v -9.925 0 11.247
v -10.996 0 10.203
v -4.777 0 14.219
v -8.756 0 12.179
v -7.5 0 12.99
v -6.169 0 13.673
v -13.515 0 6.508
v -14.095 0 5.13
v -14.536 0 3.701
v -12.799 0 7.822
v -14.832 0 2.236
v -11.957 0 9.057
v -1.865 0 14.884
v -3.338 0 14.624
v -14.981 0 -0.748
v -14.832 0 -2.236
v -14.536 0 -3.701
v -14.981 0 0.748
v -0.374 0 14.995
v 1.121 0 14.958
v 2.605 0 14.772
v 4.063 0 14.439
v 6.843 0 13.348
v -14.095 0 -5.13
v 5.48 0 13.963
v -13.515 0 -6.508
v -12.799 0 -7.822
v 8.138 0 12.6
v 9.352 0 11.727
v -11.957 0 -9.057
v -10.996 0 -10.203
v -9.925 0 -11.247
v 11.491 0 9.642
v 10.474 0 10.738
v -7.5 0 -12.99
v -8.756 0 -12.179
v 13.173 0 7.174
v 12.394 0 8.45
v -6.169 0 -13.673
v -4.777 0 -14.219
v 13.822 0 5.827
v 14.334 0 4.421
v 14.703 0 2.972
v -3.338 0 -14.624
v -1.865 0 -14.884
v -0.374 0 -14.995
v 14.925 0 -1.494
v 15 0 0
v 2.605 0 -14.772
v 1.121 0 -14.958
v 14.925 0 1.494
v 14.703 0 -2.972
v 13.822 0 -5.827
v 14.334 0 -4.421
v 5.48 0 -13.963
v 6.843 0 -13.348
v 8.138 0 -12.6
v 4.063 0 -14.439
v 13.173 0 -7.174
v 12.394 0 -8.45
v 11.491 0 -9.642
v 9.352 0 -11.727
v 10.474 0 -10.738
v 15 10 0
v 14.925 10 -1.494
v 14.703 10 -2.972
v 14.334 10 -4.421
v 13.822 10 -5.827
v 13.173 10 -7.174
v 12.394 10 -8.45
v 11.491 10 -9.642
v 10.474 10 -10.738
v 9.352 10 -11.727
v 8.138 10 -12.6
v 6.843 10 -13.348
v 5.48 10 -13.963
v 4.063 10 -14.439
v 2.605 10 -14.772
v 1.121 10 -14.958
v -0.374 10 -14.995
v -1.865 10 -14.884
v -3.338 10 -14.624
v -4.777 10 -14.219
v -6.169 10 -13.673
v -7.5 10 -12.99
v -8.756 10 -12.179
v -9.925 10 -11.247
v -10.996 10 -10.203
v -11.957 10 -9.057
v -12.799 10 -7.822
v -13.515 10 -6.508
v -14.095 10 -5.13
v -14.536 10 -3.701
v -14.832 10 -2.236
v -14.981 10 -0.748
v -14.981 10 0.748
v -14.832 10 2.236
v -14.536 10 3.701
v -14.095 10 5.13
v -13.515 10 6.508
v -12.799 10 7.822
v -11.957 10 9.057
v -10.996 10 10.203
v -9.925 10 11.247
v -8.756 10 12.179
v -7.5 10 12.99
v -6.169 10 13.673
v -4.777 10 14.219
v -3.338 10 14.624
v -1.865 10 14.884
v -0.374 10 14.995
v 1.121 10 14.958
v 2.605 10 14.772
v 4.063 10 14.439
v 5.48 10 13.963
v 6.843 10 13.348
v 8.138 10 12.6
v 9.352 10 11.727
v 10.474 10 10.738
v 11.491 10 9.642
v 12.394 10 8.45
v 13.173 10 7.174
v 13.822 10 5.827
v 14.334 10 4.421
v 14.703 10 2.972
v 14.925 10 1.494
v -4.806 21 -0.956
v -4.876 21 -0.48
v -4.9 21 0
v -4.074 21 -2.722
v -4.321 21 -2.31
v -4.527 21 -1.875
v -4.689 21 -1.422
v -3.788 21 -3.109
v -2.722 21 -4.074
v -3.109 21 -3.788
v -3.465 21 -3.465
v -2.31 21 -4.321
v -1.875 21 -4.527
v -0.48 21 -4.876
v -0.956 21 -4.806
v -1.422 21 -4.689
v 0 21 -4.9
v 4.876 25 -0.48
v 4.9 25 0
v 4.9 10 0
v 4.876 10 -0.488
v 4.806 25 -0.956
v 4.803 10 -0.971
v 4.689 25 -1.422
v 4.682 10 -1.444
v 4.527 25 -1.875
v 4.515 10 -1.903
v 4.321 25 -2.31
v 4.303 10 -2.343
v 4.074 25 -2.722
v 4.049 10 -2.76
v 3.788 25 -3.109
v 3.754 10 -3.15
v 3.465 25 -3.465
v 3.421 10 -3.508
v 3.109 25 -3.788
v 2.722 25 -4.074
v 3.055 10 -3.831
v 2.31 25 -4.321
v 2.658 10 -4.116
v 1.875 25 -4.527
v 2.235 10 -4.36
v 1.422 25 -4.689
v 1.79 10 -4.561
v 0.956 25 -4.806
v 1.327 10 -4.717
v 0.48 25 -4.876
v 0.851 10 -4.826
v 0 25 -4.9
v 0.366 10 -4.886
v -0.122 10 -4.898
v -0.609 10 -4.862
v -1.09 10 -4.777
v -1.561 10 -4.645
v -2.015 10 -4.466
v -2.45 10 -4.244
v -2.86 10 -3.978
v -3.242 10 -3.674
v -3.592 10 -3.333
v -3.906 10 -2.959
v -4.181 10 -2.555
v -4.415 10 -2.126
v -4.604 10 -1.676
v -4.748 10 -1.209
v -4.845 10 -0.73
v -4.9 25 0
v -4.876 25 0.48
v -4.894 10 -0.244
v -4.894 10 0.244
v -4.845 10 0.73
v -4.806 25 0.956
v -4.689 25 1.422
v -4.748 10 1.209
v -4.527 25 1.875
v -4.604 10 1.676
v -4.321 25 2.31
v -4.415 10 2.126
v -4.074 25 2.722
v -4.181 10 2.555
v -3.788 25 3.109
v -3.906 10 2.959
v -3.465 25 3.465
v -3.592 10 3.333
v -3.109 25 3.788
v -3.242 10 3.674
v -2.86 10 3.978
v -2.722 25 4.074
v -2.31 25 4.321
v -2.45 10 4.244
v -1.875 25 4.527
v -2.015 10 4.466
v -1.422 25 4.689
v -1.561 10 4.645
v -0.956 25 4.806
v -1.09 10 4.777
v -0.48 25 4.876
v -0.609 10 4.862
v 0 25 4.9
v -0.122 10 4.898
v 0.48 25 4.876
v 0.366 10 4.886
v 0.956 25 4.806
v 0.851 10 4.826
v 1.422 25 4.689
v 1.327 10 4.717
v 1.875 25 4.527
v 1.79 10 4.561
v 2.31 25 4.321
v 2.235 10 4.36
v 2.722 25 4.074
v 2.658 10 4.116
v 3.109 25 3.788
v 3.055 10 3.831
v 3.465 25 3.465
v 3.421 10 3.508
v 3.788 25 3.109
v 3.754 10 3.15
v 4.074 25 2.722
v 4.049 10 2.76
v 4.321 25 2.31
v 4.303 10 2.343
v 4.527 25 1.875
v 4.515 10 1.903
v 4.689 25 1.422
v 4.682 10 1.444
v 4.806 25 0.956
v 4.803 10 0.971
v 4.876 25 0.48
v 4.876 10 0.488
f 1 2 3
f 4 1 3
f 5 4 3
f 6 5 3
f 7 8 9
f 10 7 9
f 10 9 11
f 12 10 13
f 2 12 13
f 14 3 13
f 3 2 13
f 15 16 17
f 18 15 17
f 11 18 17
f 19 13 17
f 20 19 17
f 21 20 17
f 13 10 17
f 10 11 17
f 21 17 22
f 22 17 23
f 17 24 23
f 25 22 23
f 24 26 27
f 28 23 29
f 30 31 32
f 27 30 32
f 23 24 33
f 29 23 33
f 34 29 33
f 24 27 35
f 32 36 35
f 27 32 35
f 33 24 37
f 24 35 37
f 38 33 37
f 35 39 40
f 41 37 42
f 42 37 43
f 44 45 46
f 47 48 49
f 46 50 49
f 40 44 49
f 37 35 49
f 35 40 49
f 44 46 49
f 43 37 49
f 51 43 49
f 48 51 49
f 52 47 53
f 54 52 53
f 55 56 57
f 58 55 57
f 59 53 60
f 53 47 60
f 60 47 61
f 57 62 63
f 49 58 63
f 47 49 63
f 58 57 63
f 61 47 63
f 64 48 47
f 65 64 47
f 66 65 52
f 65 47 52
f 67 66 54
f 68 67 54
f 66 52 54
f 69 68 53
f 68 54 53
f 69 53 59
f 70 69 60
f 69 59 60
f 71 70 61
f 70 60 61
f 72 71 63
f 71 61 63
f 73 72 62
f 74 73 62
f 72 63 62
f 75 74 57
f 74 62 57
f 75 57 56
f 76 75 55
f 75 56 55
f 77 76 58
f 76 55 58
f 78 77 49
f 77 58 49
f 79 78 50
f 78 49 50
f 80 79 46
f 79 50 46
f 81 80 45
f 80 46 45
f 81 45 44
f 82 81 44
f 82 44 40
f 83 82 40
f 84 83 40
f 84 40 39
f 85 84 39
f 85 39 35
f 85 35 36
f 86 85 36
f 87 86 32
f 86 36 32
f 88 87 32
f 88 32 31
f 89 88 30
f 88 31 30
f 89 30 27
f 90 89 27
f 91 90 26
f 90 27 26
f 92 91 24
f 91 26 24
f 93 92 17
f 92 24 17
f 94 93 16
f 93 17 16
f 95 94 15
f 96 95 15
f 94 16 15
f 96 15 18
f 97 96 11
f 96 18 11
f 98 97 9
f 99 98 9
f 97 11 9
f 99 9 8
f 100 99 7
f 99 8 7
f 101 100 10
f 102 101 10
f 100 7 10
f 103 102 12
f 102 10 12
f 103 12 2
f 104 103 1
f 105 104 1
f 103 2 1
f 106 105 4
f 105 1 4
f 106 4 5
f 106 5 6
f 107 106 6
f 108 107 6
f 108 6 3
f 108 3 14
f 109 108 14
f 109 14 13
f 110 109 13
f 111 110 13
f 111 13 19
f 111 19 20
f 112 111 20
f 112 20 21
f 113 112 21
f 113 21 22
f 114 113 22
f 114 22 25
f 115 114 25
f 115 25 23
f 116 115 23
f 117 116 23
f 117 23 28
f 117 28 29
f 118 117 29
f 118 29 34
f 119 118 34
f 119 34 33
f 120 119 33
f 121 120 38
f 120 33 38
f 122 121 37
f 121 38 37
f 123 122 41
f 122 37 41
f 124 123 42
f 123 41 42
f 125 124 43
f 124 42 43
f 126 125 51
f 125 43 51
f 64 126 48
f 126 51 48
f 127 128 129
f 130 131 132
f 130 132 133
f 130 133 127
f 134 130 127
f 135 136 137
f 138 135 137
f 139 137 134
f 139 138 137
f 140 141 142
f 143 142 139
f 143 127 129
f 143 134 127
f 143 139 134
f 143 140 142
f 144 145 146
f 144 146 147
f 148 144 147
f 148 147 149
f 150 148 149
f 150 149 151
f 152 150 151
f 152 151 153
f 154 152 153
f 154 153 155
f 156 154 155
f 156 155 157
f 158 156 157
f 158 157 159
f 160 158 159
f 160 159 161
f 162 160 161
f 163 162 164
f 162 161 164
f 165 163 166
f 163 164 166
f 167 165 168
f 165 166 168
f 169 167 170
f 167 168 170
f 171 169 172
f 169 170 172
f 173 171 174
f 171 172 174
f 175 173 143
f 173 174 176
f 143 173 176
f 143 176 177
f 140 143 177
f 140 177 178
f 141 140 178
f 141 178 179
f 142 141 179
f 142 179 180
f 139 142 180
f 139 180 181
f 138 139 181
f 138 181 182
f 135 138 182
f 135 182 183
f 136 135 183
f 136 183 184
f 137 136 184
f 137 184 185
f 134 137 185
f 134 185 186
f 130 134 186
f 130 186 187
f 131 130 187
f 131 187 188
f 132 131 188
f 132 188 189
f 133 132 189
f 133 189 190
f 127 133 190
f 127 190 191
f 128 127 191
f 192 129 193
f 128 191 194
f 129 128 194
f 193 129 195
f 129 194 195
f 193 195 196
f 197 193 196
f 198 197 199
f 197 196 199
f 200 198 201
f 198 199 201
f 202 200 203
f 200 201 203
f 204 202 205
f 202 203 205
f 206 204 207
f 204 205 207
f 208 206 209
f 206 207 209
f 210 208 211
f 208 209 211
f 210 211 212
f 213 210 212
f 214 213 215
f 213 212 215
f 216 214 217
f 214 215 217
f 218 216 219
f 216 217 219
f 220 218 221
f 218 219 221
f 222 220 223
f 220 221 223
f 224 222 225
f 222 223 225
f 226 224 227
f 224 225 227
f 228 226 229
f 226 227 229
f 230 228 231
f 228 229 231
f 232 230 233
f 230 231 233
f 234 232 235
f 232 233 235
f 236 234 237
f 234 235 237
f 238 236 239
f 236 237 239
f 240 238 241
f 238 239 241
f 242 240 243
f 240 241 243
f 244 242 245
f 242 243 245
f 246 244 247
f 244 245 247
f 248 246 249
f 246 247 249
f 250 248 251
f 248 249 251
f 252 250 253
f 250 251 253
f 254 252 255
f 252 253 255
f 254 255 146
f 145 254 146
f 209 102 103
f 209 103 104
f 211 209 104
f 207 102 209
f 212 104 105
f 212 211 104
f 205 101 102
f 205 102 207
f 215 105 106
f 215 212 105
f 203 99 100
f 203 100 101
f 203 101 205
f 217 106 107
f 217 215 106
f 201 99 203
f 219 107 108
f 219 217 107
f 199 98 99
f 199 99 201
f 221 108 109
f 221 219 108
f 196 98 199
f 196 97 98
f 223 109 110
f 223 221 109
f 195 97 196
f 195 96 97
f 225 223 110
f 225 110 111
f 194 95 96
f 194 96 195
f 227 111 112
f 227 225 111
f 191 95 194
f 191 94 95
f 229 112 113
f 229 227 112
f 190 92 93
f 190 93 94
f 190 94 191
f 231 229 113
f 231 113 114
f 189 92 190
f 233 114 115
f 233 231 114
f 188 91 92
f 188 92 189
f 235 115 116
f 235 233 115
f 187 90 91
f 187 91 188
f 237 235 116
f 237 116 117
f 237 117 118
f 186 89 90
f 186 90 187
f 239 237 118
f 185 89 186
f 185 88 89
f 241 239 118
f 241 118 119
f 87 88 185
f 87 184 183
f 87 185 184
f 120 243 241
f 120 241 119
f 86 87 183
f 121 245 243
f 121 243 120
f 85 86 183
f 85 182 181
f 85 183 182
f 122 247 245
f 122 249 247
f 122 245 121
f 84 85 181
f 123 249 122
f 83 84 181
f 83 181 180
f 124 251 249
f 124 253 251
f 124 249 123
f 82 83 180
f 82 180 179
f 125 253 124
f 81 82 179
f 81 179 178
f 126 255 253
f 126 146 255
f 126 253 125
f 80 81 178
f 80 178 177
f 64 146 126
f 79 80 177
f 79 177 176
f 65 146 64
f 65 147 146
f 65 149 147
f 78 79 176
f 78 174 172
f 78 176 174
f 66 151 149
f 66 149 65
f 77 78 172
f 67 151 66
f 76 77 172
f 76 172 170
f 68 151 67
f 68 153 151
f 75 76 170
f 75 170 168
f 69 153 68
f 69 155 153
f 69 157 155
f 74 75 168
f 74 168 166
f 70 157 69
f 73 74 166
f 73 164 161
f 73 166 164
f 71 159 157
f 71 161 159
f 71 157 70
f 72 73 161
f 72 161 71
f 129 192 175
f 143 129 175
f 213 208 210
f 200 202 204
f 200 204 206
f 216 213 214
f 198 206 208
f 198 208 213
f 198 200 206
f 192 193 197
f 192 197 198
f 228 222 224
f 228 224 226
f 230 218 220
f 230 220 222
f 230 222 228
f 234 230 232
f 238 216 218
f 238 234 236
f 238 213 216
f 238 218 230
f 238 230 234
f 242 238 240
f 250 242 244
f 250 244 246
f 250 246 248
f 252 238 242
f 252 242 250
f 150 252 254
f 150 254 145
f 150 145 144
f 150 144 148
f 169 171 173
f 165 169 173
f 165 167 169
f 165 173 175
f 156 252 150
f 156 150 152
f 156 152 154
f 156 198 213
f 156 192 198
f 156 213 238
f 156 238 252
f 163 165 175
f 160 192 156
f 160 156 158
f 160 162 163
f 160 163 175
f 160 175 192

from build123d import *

# Parameters (mm, degrees)
SKETCH1_R           = 15
BOSS_EXTRUDE1_DEPTH = 10
SKETCH2_R           = 4.9
BOSS_EXTRUDE2_DEPTH = 15
CUT_EXTRUDE1_DEPTH  = 4


with BuildPart() as part:
    # Sketch1 → Boss-Extrude1 (new body)
    with BuildSketch(Plane(origin=(0, 0, 0), x_dir=(1, 0, 0), z_dir=(0, 1, 0))):
        Circle(SKETCH1_R)
    extrude(amount=BOSS_EXTRUDE1_DEPTH)

    # Sketch2 → Boss-Extrude2 (add)
    with BuildSketch(Plane(origin=(0, 10, 0), x_dir=(1, 0, 0), z_dir=(0, 1, 0))):
        Circle(SKETCH2_R)
    extrude(amount=BOSS_EXTRUDE2_DEPTH)

    # Sketch3 → Cut-Extrude1 (cut)
    with BuildSketch(Plane(origin=(0, 25, 0), x_dir=(1, 0, 0), z_dir=(0, 1, 0))):
        with BuildLine():
            Line((-4.9, 0), (0, 4.9))
            ThreePointArc((0, 4.9), (-3.464823228, 3.464823228), (-4.9, 0))
        make_face()
    extrude(amount=-CUT_EXTRUDE1_DEPTH, mode=Mode.SUBTRACT)


solid = part.part
